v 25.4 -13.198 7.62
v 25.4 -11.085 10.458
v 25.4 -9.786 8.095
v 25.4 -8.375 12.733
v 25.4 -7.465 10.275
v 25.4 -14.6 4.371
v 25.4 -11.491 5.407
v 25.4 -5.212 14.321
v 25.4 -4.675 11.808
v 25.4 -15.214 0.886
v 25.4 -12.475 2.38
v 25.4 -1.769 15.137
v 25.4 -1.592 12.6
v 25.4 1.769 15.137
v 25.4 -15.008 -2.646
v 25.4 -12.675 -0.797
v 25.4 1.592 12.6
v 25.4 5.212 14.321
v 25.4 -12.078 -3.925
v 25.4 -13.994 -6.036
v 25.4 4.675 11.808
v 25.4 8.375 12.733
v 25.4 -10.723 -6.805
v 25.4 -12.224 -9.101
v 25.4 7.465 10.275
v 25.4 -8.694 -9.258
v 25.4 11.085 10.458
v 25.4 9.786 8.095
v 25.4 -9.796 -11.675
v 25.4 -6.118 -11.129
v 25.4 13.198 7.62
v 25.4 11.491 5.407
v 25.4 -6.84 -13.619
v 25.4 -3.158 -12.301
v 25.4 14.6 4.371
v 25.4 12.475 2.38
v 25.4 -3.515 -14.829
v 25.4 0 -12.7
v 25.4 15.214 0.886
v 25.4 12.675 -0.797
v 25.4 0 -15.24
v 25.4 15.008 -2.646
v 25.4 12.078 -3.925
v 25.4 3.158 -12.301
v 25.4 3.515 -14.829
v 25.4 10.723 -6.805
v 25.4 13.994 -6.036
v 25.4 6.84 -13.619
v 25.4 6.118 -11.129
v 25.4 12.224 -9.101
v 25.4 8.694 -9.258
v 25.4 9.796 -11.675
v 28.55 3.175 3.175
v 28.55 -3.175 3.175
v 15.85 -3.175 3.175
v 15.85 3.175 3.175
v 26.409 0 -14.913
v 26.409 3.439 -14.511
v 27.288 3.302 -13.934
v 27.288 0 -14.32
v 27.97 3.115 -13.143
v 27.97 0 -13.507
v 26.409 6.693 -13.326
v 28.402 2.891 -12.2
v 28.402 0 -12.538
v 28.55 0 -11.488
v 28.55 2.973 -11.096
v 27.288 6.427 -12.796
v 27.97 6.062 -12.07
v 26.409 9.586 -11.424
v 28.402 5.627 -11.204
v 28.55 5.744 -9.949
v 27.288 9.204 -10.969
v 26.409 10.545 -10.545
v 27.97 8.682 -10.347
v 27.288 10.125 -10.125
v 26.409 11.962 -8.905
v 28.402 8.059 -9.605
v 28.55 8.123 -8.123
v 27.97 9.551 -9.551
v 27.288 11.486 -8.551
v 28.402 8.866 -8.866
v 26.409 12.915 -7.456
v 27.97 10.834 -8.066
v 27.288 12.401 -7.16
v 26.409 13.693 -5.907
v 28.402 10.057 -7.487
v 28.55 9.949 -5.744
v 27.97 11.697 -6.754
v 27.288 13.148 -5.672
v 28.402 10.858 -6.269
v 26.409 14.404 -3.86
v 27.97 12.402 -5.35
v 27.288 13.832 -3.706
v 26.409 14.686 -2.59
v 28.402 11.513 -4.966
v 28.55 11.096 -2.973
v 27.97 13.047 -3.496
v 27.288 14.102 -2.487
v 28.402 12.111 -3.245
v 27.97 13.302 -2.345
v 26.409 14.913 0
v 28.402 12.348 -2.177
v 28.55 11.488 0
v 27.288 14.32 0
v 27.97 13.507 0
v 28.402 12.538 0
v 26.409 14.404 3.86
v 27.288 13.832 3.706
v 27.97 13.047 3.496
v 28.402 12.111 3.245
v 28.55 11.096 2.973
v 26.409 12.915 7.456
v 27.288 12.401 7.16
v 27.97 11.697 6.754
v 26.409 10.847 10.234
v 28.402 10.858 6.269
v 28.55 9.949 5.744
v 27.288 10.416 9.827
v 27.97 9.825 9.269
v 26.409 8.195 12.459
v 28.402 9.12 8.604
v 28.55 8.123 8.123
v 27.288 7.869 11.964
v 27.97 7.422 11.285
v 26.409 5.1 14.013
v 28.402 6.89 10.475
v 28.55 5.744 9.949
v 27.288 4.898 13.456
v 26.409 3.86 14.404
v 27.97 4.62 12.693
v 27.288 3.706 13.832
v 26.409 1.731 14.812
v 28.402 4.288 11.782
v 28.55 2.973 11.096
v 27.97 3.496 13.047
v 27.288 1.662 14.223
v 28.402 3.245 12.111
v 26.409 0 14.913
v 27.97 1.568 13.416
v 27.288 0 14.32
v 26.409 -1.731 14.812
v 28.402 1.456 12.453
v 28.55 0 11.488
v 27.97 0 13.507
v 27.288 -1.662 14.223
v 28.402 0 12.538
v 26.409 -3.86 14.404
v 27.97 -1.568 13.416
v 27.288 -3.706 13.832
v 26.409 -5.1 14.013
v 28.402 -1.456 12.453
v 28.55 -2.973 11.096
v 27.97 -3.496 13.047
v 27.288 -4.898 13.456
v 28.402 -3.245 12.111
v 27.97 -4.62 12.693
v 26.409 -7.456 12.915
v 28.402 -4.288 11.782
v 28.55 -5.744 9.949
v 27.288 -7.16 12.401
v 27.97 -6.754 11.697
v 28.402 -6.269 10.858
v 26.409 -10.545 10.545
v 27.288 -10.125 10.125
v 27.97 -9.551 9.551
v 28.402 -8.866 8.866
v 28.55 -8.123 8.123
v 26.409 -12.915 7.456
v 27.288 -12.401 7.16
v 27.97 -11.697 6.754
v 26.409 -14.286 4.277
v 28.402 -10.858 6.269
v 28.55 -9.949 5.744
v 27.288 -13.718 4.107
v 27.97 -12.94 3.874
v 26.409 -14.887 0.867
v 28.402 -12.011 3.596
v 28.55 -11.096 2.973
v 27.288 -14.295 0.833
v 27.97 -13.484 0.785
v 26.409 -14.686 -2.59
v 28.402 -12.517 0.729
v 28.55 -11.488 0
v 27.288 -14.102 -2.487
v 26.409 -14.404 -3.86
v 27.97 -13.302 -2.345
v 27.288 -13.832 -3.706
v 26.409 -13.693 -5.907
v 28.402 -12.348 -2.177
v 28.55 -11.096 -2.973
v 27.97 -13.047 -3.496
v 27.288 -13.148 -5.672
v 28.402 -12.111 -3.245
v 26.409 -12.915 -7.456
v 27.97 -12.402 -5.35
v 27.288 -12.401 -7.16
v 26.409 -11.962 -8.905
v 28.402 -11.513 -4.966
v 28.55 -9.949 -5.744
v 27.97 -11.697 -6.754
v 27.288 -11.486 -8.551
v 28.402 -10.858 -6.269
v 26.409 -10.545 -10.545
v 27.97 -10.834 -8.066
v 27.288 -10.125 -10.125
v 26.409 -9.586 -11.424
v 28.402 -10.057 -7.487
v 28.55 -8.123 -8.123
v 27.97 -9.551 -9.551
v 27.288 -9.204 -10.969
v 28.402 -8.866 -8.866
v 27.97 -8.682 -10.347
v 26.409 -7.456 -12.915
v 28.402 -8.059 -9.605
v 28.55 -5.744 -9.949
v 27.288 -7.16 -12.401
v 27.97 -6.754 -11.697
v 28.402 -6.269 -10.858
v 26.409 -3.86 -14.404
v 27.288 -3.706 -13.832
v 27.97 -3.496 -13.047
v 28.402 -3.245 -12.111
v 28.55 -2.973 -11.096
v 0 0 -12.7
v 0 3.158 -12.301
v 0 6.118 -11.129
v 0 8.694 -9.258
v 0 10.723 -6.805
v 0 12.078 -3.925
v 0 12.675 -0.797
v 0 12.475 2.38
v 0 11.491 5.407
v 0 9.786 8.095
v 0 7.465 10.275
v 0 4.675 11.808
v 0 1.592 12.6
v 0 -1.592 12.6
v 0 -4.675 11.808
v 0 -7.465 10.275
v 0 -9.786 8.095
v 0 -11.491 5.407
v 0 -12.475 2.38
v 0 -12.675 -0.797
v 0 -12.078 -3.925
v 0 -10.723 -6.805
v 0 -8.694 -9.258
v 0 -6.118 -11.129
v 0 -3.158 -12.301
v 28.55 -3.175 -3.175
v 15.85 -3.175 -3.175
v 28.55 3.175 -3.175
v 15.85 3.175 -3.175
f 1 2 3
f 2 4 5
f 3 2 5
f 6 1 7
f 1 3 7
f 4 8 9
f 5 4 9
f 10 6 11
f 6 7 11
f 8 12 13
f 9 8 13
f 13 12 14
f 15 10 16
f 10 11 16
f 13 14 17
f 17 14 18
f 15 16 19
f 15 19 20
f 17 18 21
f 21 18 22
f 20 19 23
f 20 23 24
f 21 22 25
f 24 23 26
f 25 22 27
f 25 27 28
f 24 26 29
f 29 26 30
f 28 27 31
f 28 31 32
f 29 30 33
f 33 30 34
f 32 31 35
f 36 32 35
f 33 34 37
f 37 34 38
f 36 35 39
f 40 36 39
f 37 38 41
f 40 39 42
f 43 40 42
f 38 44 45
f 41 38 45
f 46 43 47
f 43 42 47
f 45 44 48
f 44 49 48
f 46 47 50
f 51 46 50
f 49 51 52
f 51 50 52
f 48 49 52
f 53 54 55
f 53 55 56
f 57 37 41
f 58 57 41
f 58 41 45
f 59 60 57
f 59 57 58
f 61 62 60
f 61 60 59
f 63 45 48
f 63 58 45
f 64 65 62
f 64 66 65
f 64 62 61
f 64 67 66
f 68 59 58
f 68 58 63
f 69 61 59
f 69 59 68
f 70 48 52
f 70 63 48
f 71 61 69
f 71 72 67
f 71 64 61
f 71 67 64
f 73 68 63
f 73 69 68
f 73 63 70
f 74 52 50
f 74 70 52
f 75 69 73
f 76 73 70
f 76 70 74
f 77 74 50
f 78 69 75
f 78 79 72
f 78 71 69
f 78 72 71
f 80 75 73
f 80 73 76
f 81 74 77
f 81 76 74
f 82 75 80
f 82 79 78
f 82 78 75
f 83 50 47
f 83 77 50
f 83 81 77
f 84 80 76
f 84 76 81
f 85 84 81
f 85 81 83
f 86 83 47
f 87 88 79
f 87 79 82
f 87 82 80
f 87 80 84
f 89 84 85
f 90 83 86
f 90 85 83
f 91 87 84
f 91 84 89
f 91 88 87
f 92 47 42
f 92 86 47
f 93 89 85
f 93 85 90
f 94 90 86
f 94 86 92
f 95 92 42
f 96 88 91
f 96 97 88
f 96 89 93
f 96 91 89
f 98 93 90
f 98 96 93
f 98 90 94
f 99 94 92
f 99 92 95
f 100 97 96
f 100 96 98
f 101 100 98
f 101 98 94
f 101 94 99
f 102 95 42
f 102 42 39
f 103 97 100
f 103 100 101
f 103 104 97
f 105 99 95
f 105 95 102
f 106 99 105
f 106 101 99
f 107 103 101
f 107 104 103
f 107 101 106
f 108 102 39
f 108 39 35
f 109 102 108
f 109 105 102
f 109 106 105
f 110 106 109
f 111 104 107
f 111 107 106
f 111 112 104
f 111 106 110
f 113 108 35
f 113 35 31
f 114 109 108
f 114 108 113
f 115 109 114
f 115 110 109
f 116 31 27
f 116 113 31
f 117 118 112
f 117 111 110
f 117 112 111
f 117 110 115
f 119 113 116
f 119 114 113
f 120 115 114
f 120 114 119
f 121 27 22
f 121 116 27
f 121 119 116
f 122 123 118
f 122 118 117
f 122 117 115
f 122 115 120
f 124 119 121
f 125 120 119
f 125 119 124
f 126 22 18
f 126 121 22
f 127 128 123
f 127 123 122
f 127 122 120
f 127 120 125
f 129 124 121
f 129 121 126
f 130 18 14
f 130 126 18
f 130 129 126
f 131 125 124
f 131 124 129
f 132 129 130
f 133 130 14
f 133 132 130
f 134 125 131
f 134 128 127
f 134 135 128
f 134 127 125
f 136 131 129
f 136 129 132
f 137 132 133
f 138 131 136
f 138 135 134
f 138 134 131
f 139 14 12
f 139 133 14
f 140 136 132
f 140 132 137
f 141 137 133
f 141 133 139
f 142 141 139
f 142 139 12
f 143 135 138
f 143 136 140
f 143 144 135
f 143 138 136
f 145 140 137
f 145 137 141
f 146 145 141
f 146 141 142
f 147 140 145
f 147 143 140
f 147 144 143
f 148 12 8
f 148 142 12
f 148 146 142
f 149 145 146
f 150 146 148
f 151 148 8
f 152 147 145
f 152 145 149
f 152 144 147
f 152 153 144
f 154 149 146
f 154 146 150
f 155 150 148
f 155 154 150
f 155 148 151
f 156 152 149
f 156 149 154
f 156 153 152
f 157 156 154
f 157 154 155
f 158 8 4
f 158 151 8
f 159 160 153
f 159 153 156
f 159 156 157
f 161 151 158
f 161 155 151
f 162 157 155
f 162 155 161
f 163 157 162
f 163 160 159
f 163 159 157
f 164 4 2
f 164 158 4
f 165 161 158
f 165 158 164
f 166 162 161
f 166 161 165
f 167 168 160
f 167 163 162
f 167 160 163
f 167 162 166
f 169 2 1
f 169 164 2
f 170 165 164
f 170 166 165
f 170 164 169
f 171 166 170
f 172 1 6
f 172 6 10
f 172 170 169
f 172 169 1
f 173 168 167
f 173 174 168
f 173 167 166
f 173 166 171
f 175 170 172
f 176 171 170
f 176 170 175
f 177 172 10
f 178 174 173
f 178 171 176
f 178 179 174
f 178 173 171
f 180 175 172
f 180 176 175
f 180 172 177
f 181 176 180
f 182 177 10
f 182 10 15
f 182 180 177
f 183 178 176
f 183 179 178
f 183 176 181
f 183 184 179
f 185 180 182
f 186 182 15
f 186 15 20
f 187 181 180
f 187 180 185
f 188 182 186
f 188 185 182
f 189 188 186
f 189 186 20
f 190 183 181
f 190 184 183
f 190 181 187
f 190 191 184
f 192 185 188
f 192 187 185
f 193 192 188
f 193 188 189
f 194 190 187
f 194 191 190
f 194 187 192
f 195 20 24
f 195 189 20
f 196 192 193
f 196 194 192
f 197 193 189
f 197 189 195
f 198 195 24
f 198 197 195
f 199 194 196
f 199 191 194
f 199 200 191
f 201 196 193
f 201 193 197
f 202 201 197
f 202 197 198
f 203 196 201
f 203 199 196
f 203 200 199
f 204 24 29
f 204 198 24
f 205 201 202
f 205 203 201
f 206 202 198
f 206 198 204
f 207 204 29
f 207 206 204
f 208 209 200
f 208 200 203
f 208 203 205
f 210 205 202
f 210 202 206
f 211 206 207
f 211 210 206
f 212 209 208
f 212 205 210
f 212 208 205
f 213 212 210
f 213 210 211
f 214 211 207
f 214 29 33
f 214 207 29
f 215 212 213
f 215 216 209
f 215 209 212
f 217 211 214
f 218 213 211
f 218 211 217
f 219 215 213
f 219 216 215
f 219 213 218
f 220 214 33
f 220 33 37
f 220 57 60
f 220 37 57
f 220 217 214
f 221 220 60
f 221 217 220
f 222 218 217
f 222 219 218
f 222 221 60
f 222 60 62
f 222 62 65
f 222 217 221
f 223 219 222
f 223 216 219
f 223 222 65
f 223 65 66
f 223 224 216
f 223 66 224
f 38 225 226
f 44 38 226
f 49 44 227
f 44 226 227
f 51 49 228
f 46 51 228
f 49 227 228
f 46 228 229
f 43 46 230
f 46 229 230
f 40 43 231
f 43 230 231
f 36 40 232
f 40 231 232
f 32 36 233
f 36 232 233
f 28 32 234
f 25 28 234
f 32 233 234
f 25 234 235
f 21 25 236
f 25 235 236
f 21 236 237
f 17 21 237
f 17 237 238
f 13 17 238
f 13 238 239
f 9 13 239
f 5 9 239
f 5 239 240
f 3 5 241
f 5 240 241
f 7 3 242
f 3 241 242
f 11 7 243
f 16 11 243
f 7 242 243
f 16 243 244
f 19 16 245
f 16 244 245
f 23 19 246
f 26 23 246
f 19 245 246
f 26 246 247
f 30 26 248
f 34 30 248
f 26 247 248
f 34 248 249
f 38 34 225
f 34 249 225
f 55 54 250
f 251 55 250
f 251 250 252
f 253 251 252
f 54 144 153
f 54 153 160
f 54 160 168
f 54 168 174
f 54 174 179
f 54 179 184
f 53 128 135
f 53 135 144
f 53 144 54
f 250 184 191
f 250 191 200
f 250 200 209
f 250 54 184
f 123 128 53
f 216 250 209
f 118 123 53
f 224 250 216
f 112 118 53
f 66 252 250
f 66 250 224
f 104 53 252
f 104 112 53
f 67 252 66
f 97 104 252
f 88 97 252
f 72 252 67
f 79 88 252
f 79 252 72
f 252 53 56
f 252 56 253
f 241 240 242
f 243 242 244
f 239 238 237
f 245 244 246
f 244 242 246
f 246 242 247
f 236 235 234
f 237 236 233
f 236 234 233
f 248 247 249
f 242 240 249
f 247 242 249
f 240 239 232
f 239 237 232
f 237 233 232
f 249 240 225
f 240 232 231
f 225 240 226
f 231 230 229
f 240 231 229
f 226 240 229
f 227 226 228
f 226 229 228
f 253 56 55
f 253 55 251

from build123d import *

# Parameters (mm, degrees)
SKETCH1_R           = 12.7
BOSS_EXTRUDE1_DEPTH = 25.4
SKETCH2_R           = 15.24
BOSS_EXTRUDE2_DEPTH = 3.1496
FILLET1_R           = 3.81
SKETCH5_W           = 6.35
SKETCH5_H           = 6.35
CUT_EXTRUDE2_DEPTH  = 12.7


with BuildPart() as part:
    # Sketch1 → Boss-Extrude1 (new body)
    with BuildSketch(Plane(origin=(0, 0, 0), x_dir=(0, 0, -1), z_dir=(1, 0, 0))):
        Circle(SKETCH1_R)
    extrude(amount=BOSS_EXTRUDE1_DEPTH)

    # Sketch2 → Boss-Extrude2 (add)
    with BuildSketch(Plane(origin=(25.4, 0, 0), x_dir=(0, 0, -1), z_dir=(1, 0, 0))):
        Circle(SKETCH2_R)
    extrude(amount=BOSS_EXTRUDE2_DEPTH)

    # Fillet1
    # the kernel refuses this fillet: 3.81 mm, written as the material it takes off along each edge
    with BuildSketch(Plane(origin=(28.5496, 0, 0), x_dir=(0, 0, -1), z_dir=(0, -1, 0))) as fillet1_piece_1:
        with BuildLine():
            CenterArc((11.487671144, -3.81), FILLET1_R, 9.98168298, 80.01831702)
            Line((11.487671144, 0), (11.487671144, 0.0762))
            Line((11.487671144, 0.0762), (15.24, 0.0762))
            Line((15.24, 0.0762), (15.3162, 0))
            ThreePointArc((15.3162, 0), (15.3162, -1.5748), (15.315046577, -3.136392))
            Line((15.315046577, -3.136392), (15.24, -3.1496))
        make_face()
    revolve(axis=Axis((28.5496, 0, 0), (1, 0, 0)), mode=Mode.SUBTRACT)

    # Sketch5 → Cut-Extrude2 (cut)
    with BuildSketch(Plane(origin=(28.5496, 0, 0), x_dir=(0, 0, -1), z_dir=(1, 0, 0))):
        Rectangle(SKETCH5_W, SKETCH5_H)
    extrude(amount=-CUT_EXTRUDE2_DEPTH, mode=Mode.SUBTRACT)


solid = part.part
